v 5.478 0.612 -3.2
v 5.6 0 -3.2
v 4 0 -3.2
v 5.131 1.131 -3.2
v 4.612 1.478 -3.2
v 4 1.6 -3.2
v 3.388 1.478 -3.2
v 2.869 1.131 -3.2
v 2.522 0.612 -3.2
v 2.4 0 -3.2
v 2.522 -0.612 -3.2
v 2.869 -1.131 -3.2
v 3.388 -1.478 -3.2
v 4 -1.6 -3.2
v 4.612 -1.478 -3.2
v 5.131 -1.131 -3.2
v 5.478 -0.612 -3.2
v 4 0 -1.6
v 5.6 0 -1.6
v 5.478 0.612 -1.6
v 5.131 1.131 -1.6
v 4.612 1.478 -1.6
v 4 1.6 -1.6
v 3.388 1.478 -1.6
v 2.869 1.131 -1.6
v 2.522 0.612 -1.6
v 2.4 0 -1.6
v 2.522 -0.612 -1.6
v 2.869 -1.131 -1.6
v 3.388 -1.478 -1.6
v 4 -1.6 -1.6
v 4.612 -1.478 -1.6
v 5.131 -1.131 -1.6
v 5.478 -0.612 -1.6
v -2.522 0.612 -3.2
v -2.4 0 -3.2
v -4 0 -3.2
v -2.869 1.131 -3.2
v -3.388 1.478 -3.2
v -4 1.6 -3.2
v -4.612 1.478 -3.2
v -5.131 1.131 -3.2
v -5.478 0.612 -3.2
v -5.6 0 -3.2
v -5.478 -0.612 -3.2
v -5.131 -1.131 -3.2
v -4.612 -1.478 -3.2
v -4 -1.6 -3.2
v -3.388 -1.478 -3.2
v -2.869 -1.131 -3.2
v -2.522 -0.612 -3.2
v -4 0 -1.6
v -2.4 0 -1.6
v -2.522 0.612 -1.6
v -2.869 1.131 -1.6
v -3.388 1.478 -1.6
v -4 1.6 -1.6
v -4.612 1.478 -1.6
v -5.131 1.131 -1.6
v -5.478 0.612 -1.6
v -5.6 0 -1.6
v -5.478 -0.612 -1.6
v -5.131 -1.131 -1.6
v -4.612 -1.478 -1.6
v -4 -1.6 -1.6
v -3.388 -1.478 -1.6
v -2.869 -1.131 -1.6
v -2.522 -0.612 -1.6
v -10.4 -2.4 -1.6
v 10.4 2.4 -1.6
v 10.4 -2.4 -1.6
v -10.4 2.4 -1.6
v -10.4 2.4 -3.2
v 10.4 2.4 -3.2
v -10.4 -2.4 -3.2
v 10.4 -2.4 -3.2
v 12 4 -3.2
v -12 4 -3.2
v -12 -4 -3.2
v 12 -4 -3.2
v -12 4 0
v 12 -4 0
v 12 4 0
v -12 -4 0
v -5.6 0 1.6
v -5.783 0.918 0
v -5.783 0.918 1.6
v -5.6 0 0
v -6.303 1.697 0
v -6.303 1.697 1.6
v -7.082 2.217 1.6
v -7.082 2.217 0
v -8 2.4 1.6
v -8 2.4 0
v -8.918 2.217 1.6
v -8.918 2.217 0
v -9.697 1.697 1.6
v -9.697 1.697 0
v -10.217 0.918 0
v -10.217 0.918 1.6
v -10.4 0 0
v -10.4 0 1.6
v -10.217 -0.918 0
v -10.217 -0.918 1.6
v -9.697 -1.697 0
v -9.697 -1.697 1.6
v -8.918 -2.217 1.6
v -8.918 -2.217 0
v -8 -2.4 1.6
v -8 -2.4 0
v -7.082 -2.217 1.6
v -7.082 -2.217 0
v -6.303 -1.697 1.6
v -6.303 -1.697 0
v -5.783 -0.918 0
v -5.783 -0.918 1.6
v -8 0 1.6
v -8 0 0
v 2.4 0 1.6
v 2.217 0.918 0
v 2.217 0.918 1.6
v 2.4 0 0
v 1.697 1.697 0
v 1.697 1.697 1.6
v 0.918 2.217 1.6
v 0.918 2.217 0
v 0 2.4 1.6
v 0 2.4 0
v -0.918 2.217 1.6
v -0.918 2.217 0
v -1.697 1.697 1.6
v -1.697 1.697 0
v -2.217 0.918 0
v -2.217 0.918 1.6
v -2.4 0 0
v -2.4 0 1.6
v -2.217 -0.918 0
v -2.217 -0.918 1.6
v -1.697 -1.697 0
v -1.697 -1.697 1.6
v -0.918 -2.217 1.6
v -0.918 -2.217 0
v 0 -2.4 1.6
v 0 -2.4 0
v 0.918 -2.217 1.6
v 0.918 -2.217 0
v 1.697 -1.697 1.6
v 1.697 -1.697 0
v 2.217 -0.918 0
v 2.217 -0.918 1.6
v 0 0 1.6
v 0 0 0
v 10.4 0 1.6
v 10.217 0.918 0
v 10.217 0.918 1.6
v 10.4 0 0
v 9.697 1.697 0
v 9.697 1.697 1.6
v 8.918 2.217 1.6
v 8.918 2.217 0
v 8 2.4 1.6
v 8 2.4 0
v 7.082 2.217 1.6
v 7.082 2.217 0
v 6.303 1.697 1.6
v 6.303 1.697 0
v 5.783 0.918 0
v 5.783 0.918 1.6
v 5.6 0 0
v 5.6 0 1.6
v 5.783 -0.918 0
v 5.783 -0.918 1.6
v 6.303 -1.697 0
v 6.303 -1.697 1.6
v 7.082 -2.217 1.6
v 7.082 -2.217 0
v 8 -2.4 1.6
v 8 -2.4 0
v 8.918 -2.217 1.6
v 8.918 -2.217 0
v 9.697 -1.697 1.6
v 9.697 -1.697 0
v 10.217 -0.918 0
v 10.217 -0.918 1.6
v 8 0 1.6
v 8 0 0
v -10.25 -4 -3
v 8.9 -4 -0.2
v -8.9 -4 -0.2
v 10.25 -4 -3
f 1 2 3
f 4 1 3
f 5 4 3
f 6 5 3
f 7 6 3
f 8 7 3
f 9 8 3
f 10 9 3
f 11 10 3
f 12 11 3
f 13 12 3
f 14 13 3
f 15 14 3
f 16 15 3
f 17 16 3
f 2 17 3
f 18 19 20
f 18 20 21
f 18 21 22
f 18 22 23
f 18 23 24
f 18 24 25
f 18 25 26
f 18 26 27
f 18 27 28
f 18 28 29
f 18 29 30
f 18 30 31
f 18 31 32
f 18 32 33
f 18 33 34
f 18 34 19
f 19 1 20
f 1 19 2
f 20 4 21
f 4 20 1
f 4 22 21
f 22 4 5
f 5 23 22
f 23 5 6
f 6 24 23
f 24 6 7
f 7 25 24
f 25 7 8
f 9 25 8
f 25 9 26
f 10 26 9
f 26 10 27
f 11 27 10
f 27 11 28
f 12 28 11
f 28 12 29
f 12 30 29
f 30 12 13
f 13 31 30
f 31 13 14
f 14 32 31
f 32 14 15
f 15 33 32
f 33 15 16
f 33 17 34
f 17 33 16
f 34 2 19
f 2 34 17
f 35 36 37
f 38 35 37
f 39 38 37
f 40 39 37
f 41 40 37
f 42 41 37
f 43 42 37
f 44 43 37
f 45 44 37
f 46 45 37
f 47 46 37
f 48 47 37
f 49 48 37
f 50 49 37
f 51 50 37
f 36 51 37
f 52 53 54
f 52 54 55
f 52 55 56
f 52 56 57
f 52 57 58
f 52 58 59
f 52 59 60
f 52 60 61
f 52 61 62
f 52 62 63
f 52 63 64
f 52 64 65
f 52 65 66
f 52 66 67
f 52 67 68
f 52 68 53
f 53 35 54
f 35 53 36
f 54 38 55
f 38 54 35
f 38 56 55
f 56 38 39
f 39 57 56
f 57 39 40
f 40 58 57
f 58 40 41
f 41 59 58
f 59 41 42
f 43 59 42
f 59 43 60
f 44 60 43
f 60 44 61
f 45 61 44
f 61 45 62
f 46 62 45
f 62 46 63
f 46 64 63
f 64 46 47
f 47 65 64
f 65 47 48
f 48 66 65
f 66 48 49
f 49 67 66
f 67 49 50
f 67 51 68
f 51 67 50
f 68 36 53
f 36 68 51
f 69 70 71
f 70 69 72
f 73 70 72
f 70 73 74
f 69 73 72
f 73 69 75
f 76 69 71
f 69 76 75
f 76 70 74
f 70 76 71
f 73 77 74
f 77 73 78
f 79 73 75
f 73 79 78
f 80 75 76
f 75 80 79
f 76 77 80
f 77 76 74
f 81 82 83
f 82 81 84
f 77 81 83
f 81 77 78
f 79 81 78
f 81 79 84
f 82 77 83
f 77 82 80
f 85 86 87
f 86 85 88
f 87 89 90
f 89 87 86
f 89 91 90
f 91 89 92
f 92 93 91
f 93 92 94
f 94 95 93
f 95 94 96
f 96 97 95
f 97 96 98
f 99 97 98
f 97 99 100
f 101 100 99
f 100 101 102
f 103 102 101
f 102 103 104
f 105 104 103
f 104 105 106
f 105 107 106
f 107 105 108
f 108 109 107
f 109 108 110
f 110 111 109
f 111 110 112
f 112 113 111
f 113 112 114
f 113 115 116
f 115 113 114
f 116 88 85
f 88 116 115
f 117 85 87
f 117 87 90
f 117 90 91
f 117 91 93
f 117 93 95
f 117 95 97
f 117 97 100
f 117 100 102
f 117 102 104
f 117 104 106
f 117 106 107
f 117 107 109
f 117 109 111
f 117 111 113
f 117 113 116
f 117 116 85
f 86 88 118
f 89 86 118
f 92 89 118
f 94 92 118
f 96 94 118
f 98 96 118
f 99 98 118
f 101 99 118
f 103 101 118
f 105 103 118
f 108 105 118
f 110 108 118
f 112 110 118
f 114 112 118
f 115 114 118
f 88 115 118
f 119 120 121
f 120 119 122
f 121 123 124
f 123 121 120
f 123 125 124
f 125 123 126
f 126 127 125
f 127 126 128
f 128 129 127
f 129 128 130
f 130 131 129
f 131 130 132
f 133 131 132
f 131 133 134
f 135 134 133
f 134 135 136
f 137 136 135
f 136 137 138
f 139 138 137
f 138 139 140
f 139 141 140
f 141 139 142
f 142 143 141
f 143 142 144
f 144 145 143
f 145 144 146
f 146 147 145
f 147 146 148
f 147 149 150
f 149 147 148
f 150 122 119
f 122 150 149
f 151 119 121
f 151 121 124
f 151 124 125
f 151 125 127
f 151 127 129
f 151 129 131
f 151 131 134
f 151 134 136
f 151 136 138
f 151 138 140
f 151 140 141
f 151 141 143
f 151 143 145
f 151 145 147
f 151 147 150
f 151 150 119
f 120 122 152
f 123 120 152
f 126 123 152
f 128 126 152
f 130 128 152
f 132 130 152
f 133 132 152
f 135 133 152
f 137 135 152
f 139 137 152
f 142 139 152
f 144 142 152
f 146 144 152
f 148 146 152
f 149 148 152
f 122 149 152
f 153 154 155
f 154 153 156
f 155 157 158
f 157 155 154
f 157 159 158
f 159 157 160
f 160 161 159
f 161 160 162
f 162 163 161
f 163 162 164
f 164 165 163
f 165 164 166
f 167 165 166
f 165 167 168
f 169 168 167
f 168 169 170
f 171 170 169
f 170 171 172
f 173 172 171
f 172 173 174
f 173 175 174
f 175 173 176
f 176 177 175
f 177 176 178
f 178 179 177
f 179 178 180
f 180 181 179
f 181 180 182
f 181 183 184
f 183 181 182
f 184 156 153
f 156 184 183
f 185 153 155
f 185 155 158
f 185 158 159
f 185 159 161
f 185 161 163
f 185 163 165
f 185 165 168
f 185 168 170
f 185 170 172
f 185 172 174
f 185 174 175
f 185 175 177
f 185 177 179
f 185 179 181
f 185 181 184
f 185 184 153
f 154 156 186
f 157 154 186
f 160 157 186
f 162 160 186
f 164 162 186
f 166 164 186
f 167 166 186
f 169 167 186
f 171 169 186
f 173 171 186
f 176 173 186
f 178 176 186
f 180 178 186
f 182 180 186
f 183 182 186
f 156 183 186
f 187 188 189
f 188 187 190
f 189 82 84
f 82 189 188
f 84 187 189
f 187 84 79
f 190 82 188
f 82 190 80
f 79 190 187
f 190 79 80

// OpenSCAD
// file: ../p/stud.scad
use <../lib.scad>
use <4-4cyli.scad>
use <4-4disc.scad>
use <4-4edge.scad>
function ldraw_lib__stud() = [
// 0 Stud
// 0 Name: stud.dat
// 0 Author: James Jessiman
// 0 !LDRAW_ORG Primitive UPDATE 2012-01
// 0 !LICENSE Licensed under CC BY 4.0 : see CAreadme.txt
// 
// 0 BFC CERTIFY CCW
  [0,"BFC","CERTIFY"],
  [0,"BFC","CCW"],
// 
// 0 !HISTORY 2002-04-04 [sbliss] Modified for BFC compliance
// 0 !HISTORY 2002-04-25 [PTadmin] Official Update 2002-02
// 0 !HISTORY 2007-06-24 [PTadmin] Header formatted for Contributor Agreement
// 0 !HISTORY 2008-07-01 [PTadmin] Official Update 2008-01
// 0 !HISTORY 2012-02-16 [Philo] Changed to CCW
// 0 !HISTORY 2012-03-30 [PTadmin] Official Update 2012-01
// 
// 
// 1 16 0 0 0 6 0 0 0 1 0 0 0 6 4-4edge.dat
  [1,16,0,0,0,6,0,0,0,1,0,0,0,6, ldraw_lib__4_4edge()],
// 1 16 0 -4 0 6 0 0 0 1 0 0 0 6 4-4edge.dat
  [1,16,0,-4,0,6,0,0,0,1,0,0,0,6, ldraw_lib__4_4edge()],
// 1 16 0 0 0 6 0 0 0 -4 0 0 0 6 4-4cyli.dat
  [1,16,0,0,0,6,0,0,0,-4,0,0,0,6, ldraw_lib__4_4cyli()],
// 1 16 0 -4 0 6 0 0 0 1 0 0 0 6 4-4disc.dat
  [1,16,0,-4,0,6,0,0,0,1,0,0,0,6, ldraw_lib__4_4disc()],
  [-1,16,0,0,0,6,0,0,0,-1,0,0,0,6, ldraw_lib__4_4disc()],
];
module ldraw_lib__stud(step=0, col=false, unit=2/5, alt=false, line=0.2, solid=!$preview)
    makepoly(ldraw_lib__stud(), step=step, col=col, unit=unit, alt=alt, line=line, solid=solid);
ldraw_lib__stud(line=0.2);
// file: ../p/4-4edge.scad
use <../lib.scad>
function ldraw_lib__4_4edge() = [
// 0 Circle 1.0
// 0 Name: 4-4edge.dat
// 0 Author: James Jessiman
// 0 !LDRAW_ORG Primitive UPDATE 2017-01
// 0 !LICENSE Licensed under CC BY 2.0 and CC BY 4.0 : see CAreadme.txt
// 
// 0 BFC CERTIFY CCW
  [0,"BFC","CERTIFY"],
  [0,"BFC","CCW"],
// 
// 0 !HISTORY 1998-12-15 [PTadmin] Official Update 1998-10
// 0 !HISTORY 2005-12-28 [PTadmin] Official Update 2005-01
// 0 !HISTORY 2007-06-24 [PTadmin] Header formatted for Contributor Agreement
// 0 !HISTORY 2008-07-01 [PTadmin] Official Update 2008-01
// 0 !HISTORY 2017-01-15 [Steffen] BFCed
// 0 !HISTORY 2017-12-30 [PTadmin] Official Update 2017-01
// 
// 
// 2 24 1 0 0 0.9239 0 0.3827
  [2,24,1,0,0,0.9239,0,0.3827],
// 2 24 0.9239 0 0.3827 0.7071 0 0.7071
  [2,24,0.9239,0,0.3827,0.7071,0,0.7071],
// 2 24 0.7071 0 0.7071 0.3827 0 0.9239
  [2,24,0.7071,0,0.7071,0.3827,0,0.9239],
// 2 24 0.3827 0 0.9239 0 0 1
  [2,24,0.3827,0,0.9239,0,0,1],
// 2 24 0 0 1 -0.3827 0 0.9239
  [2,24,0,0,1,-0.3827,0,0.9239],
// 2 24 -0.3827 0 0.9239 -0.7071 0 0.7071
  [2,24,-0.3827,0,0.9239,-0.7071,0,0.7071],
// 2 24 -0.7071 0 0.7071 -0.9239 0 0.3827
  [2,24,-0.7071,0,0.7071,-0.9239,0,0.3827],
// 2 24 -0.9239 0 0.3827 -1 0 -0
  [2,24,-0.9239,0,0.3827,-1,0,-0],
// 2 24 -1 0 -0 -0.9239 0 -0.3827
  [2,24,-1,0,-0,-0.9239,0,-0.3827],
// 2 24 -0.9239 0 -0.3827 -0.7071 0 -0.7071
  [2,24,-0.9239,0,-0.3827,-0.7071,0,-0.7071],
// 2 24 -0.7071 0 -0.7071 -0.3827 0 -0.9239
  [2,24,-0.7071,0,-0.7071,-0.3827,0,-0.9239],
// 2 24 -0.3827 0 -0.9239 0 0 -1
  [2,24,-0.3827,0,-0.9239,0,0,-1],
// 2 24 0 0 -1 0.3827 0 -0.9239
  [2,24,0,0,-1,0.3827,0,-0.9239],
// 2 24 0.3827 0 -0.9239 0.7071 0 -0.7071
  [2,24,0.3827,0,-0.9239,0.7071,0,-0.7071],
// 2 24 0.7071 0 -0.7071 0.9239 0 -0.3827
  [2,24,0.7071,0,-0.7071,0.9239,0,-0.3827],
// 2 24 0.9239 0 -0.3827 1 0 0
  [2,24,0.9239,0,-0.3827,1,0,0],
];
module ldraw_lib__4_4edge(step=0, col=false, unit=2/5, alt=false, line=0.2, solid=!$preview)
    makepoly(ldraw_lib__4_4edge(), step=step, col=col, unit=unit, alt=alt, line=line, solid=solid);
ldraw_lib__4_4edge(line=0.2);
// file: ../p/4-4disc.scad
use <../lib.scad>
function ldraw_lib__4_4disc() = [
// 0 Disc 1.0
// 0 Name: 4-4disc.dat
// 0 Author: James Jessiman
// 0 !LDRAW_ORG Primitive UPDATE 2002-02
// 0 !LICENSE Licensed under CC BY 2.0 and CC BY 4.0 : see CAreadme.txt
// 
// 0 BFC CERTIFY CCW
  [0,"BFC","CERTIFY"],
  [0,"BFC","CCW"],
// 
// 0 !HISTORY 1998-12-15 [PTadmin] Official Update 1998-10
// 0 !HISTORY 2002-03-23 [sbliss] Added BFC statement
// 0 !HISTORY 2002-04-25 [PTadmin] Official Update 2002-02
// 0 !HISTORY 2007-06-24 [PTadmin] Header formatted for Contributor Agreement
// 0 !HISTORY 2008-07-01 [PTadmin] Official Update 2008-01
// 
// 
// 3 16 0 0 0 1 0 0 0.9239 0 0.3827
  [3,16,0,0,0,1,0,0,0.9239,0,0.3827],
// 3 16 0 0 0 0.9239 0 0.3827 0.7071 0 0.7071
  [3,16,0,0,0,0.9239,0,0.3827,0.7071,0,0.7071],
// 3 16 0 0 0 0.7071 0 0.7071 0.3827 0 0.9239
  [3,16,0,0,0,0.7071,0,0.7071,0.3827,0,0.9239],
// 3 16 0 0 0 0.3827 0 0.9239 0 0 1
  [3,16,0,0,0,0.3827,0,0.9239,0,0,1],
// 3 16 0 0 0 0 0 1 -0.3827 0 0.9239
  [3,16,0,0,0,0,0,1,-0.3827,0,0.9239],
// 3 16 0 0 0 -0.3827 0 0.9239 -0.7071 0 0.7071
  [3,16,0,0,0,-0.3827,0,0.9239,-0.7071,0,0.7071],
// 3 16 0 0 0 -0.7071 0 0.7071 -0.9239 0 0.3827
  [3,16,0,0,0,-0.7071,0,0.7071,-0.9239,0,0.3827],
// 3 16 0 0 0 -0.9239 0 0.3827 -1 0 -0
  [3,16,0,0,0,-0.9239,0,0.3827,-1,0,-0],
// 3 16 0 0 0 -1 0 -0 -0.9239 0 -0.3827
  [3,16,0,0,0,-1,0,-0,-0.9239,0,-0.3827],
// 3 16 0 0 0 -0.9239 0 -0.3827 -0.7071 0 -0.7071
  [3,16,0,0,0,-0.9239,0,-0.3827,-0.7071,0,-0.7071],
// 3 16 0 0 0 -0.7071 0 -0.7071 -0.3827 0 -0.9239
  [3,16,0,0,0,-0.7071,0,-0.7071,-0.3827,0,-0.9239],
// 3 16 0 0 0 -0.3827 0 -0.9239 0 0 -1
  [3,16,0,0,0,-0.3827,0,-0.9239,0,0,-1],
// 3 16 0 0 0 0 0 -1 0.3827 0 -0.9239
  [3,16,0,0,0,0,0,-1,0.3827,0,-0.9239],
// 3 16 0 0 0 0.3827 0 -0.9239 0.7071 0 -0.7071
  [3,16,0,0,0,0.3827,0,-0.9239,0.7071,0,-0.7071],
// 3 16 0 0 0 0.7071 0 -0.7071 0.9239 0 -0.3827
  [3,16,0,0,0,0.7071,0,-0.7071,0.9239,0,-0.3827],
// 3 16 0 0 0 0.9239 0 -0.3827 1 0 0
  [3,16,0,0,0,0.9239,0,-0.3827,1,0,0],
// 0
];
module ldraw_lib__4_4disc(step=0, col=false, unit=2/5, alt=false, line=0.2, solid=!$preview)
    makepoly(ldraw_lib__4_4disc(), step=step, col=col, unit=unit, alt=alt, line=line, solid=solid);
ldraw_lib__4_4disc(line=0.2);
// file: ../p/4-4cyli.scad
use <../lib.scad>
$fa=1; $fs=0.2;
function ldraw_lib__4_4cyli(realsolid=false) = [
// 0 Cylinder 1.0
// 0 Name: 4-4cyli.dat
// 0 Author: James Jessiman
// 0 !LDRAW_ORG Primitive UPDATE 2005-01
// 0 !LICENSE Licensed under CC BY 2.0 and CC BY 4.0 : see CAreadme.txt
// 
// 0 BFC CERTIFY CCW
  [0,"BFC","CERTIFY"],
  [0,"BFC","CCW"],
// 
// 0 !HISTORY 1998-12-15 [PTadmin] Official Update 1998-10
// 0 !HISTORY 2002-03-23 [sbliss] Added BFC statement; merged headers from files in distributions LDraw 0.27 and Complete.
// 0 !HISTORY 2002-04-25 [PTadmin] Official Update 2002-02
// 0 !HISTORY 2004-12-14 [guyvivan] BFC CCW
// 0 !HISTORY 2005-12-28 [PTadmin] Official Update 2005-01
// 0 !HISTORY 2007-06-24 [PTadmin] Header formatted for Contributor Agreement
// 0 !HISTORY 2008-07-01 [PTadmin] Official Update 2008-01
// 
// 
// 4 16 1 1 0 0.9239 1 0.3827 0.9239 0 0.3827 1 0 0
  [4,16,1,1,0,0.9239,1,0.3827,0.9239,0,0.3827,1,0,0],
// 5 24 1 0 0 1 1 0 0.9239 0 0.3827 0.9239 0 -0.3827
  [5,24,1,0,0,1,1,0,0.9239,0,0.3827,0.9239,0,-0.3827],
// 4 16 0.9239 1 0.3827 0.7071 1 0.7071 0.7071 0 0.7071 0.9239 0 0.3827
  [4,16,0.9239,1,0.3827,0.7071,1,0.7071,0.7071,0,0.7071,0.9239,0,0.3827],
// 5 24 0.9239 0 0.3827 0.9239 1 0.3827 0.7071 0 0.7071 1 0 0
  [5,24,0.9239,0,0.3827,0.9239,1,0.3827,0.7071,0,0.7071,1,0,0],
// 4 16 0.7071 1 0.7071 0.3827 1 0.9239 0.3827 0 0.9239 0.7071 0 0.7071
  [4,16,0.7071,1,0.7071,0.3827,1,0.9239,0.3827,0,0.9239,0.7071,0,0.7071],
// 5 24 0.7071 0 0.7071 0.7071 1 0.7071 0.3827 0 0.9239 0.9239 0 0.3827
  [5,24,0.7071,0,0.7071,0.7071,1,0.7071,0.3827,0,0.9239,0.9239,0,0.3827],
// 4 16 0.3827 1 0.9239 0 1 1 0 0 1 0.3827 0 0.9239
  [4,16,0.3827,1,0.9239,0,1,1,0,0,1,0.3827,0,0.9239],
// 5 24 0.3827 0 0.9239 0.3827 1 0.9239 0 0 1 0.7071 0 0.7071
  [5,24,0.3827,0,0.9239,0.3827,1,0.9239,0,0,1,0.7071,0,0.7071],
// 4 16 0 1 1 -0.3827 1 0.9239 -0.3827 0 0.9239 0 0 1
  [4,16,0,1,1,-0.3827,1,0.9239,-0.3827,0,0.9239,0,0,1],
// 5 24 0 0 1 0 1 1 -0.3827 0 0.9239 0.3827 0 0.9239
  [5,24,0,0,1,0,1,1,-0.3827,0,0.9239,0.3827,0,0.9239],
// 4 16 -0.3827 1 0.9239 -0.7071 1 0.7071 -0.7071 0 0.7071 -0.3827 0 0.9239
  [4,16,-0.3827,1,0.9239,-0.7071,1,0.7071,-0.7071,0,0.7071,-0.3827,0,0.9239],
// 5 24 -0.3827 0 0.9239 -0.3827 1 0.9239 -0.7071 0 0.7071 0 0 1
  [5,24,-0.3827,0,0.9239,-0.3827,1,0.9239,-0.7071,0,0.7071,0,0,1],
// 4 16 -0.7071 1 0.7071 -0.9239 1 0.3827 -0.9239 0 0.3827 -0.7071 0 0.7071
  [4,16,-0.7071,1,0.7071,-0.9239,1,0.3827,-0.9239,0,0.3827,-0.7071,0,0.7071],
// 5 24 -0.7071 0 0.7071 -0.7071 1 0.7071 -0.9239 0 0.3827 -0.3827 0 0.9239
  [5,24,-0.7071,0,0.7071,-0.7071,1,0.7071,-0.9239,0,0.3827,-0.3827,0,0.9239],
// 4 16 -0.9239 1 0.3827 -1 1 0 -1 0 0 -0.9239 0 0.3827
  [4,16,-0.9239,1,0.3827,-1,1,0,-1,0,0,-0.9239,0,0.3827],
// 5 24 -0.9239 0 0.3827 -0.9239 1 0.3827 -1 0 0 -0.7071 0 0.7071
  [5,24,-0.9239,0,0.3827,-0.9239,1,0.3827,-1,0,0,-0.7071,0,0.7071],
// 4 16 -1 1 0 -0.9239 1 -0.3827 -0.9239 0 -0.3827 -1 0 0
  [4,16,-1,1,0,-0.9239,1,-0.3827,-0.9239,0,-0.3827,-1,0,0],
// 5 24 -1 0 0 -1 1 0 -0.9239 0 -0.3827 -0.9239 0 0.3827
  [5,24,-1,0,0,-1,1,0,-0.9239,0,-0.3827,-0.9239,0,0.3827],
// 4 16 -0.9239 1 -0.3827 -0.7071 1 -0.7071 -0.7071 0 -0.7071 -0.9239 0 -0.3827
  [4,16,-0.9239,1,-0.3827,-0.7071,1,-0.7071,-0.7071,0,-0.7071,-0.9239,0,-0.3827],
// 5 24 -0.9239 0 -0.3827 -0.9239 1 -0.3827 -0.7071 0 -0.7071 -1 0 0
  [5,24,-0.9239,0,-0.3827,-0.9239,1,-0.3827,-0.7071,0,-0.7071,-1,0,0],
// 4 16 -0.7071 1 -0.7071 -0.3827 1 -0.9239 -0.3827 0 -0.9239 -0.7071 0 -0.7071
  [4,16,-0.7071,1,-0.7071,-0.3827,1,-0.9239,-0.3827,0,-0.9239,-0.7071,0,-0.7071],
// 5 24 -0.7071 0 -0.7071 -0.7071 1 -0.7071 -0.3827 0 -0.9239 -0.9239 0 -0.3827
  [5,24,-0.7071,0,-0.7071,-0.7071,1,-0.7071,-0.3827,0,-0.9239,-0.9239,0,-0.3827],
// 4 16 -0.3827 1 -0.9239 0 1 -1 0 0 -1 -0.3827 0 -0.9239
  [4,16,-0.3827,1,-0.9239,0,1,-1,0,0,-1,-0.3827,0,-0.9239],
// 5 24 -0.3827 0 -0.9239 -0.3827 1 -0.9239 0 0 -1 -0.7071 0 -0.7071
  [5,24,-0.3827,0,-0.9239,-0.3827,1,-0.9239,0,0,-1,-0.7071,0,-0.7071],
// 4 16 0 1 -1 0.3827 1 -0.9239 0.3827 0 -0.9239 0 0 -1
  [4,16,0,1,-1,0.3827,1,-0.9239,0.3827,0,-0.9239,0,0,-1],
// 5 24 0 0 -1 0 1 -1 0.3827 0 -0.9239 -0.3827 0 -0.9239
  [5,24,0,0,-1,0,1,-1,0.3827,0,-0.9239,-0.3827,0,-0.9239],
// 4 16 0.3827 1 -0.9239 0.7071 1 -0.7071 0.7071 0 -0.7071 0.3827 0 -0.9239
  [4,16,0.3827,1,-0.9239,0.7071,1,-0.7071,0.7071,0,-0.7071,0.3827,0,-0.9239],
// 5 24 0.3827 0 -0.9239 0.3827 1 -0.9239 0.7071 0 -0.7071 0 0 -1
  [5,24,0.3827,0,-0.9239,0.3827,1,-0.9239,0.7071,0,-0.7071,0,0,-1],
// 4 16 0.7071 1 -0.7071 0.9239 1 -0.3827 0.9239 0 -0.3827 0.7071 0 -0.7071
  [4,16,0.7071,1,-0.7071,0.9239,1,-0.3827,0.9239,0,-0.3827,0.7071,0,-0.7071],
// 5 24 0.7071 0 -0.7071 0.7071 1 -0.7071 0.9239 0 -0.3827 0.3827 0 -0.9239
  [5,24,0.7071,0,-0.7071,0.7071,1,-0.7071,0.9239,0,-0.3827,0.3827,0,-0.9239],
// 4 16 0.9239 1 -0.3827 1 1 0 1 0 0 0.9239 0 -0.3827
  [4,16,0.9239,1,-0.3827,1,1,0,1,0,0,0.9239,0,-0.3827],
// 5 24 0.9239 0 -0.3827 0.9239 1 -0.3827 1 0 0 0.7071 0 -0.7071
  [5,24,0.9239,0,-0.3827,0.9239,1,-0.3827,1,0,0,0.7071,0,-0.7071],
// 0
];
module ldraw_lib__4_4cyli(step=0, col=false, unit=2/5, alt=false, line=0.2, solid=!$preview)
    makepoly(ldraw_lib__4_4cyli(solid), step=step, col=col, unit=unit, alt=alt, line=line, solid=solid);
ldraw_lib__4_4cyli(line=0.2);
// file: ../p/stug-1x3.scad
use <../lib.scad>
use <stud.scad>
$fa=1; $fs=0.2;
function ldraw_lib__stug_1x3(realsolid=false) = [
// 0 Stud Group  1 x  3
// 0 Name: stug-1x3.dat
// 0 Author: Steffen [Steffen]
// 0 !LDRAW_ORG Primitive UPDATE 2012-01
// 0 !LICENSE Licensed under CC BY 2.0 and CC BY 4.0 : see CAreadme.txt
// 
// 0 BFC CERTIFY CCW
  [0,"BFC","CERTIFY"],
  [0,"BFC","CCW"],
// 
// 0 !HISTORY 2012-03-30 [PTadmin] Official Update 2012-01
// 
// 
// 1 16 -20 0 0 1 0 0 0 1 0 0 0 1 stud.dat
  [1,16,-20,0,0,1,0,0,0,1,0,0,0,1, ldraw_lib__stud(realsolid)],
// 1 16 0 0 0 1 0 0 0 1 0 0 0 1 stud.dat
  [1,16,0,0,0,1,0,0,0,1,0,0,0,1, ldraw_lib__stud(realsolid)],
// 1 16 20 0 0 1 0 0 0 1 0 0 0 1 stud.dat
  [1,16,20,0,0,1,0,0,0,1,0,0,0,1, ldraw_lib__stud(realsolid)],
];
module ldraw_lib__stug_1x3(step=0, col=false, unit=2/5, alt=false, line=0.2, solid=!$preview)
    makepoly(ldraw_lib__stug_1x3(solid), step=step, col=col, unit=unit, alt=alt, line=line, solid=solid);
ldraw_lib__stug_1x3(line=0.2);
// file: ../p/stud3.scad
use <../lib.scad>
use <4-4cyli.scad>
use <4-4disc.scad>
use <4-4edge.scad>
function ldraw_lib__stud3() = [
// 0 Stud Tube Solid
// 0 Name: stud3.dat
// 0 Author: James Jessiman
// 0 !LDRAW_ORG Primitive UPDATE 2012-01
// 0 !LICENSE Licensed under CC BY 4.0 : see CAreadme.txt
// 
// 0 BFC CERTIFY CCW
  [0,"BFC","CERTIFY"],
  [0,"BFC","CCW"],
// 
// 0 !HISTORY 2002-04-04 [sbliss] Modified for BFC compliance
// 0 !HISTORY 2002-04-25 [PTadmin] Official Update 2002-02
// 0 !HISTORY 2007-06-24 [PTadmin] Header formatted for Contributor Agreement
// 0 !HISTORY 2008-07-01 [PTadmin] Official Update 2008-01
// 0 !HISTORY 2012-02-16 [Philo] Changed to CCW
// 0 !HISTORY 2012-03-30 [PTadmin] Official Update 2012-01
// 
// 
// 1 16 0 -4 0 4 0 0 0 1 0 0 0 4 4-4edge.dat
  [1,16,0,-4,0,4,0,0,0,1,0,0,0,4, ldraw_lib__4_4edge()],
// 1 16 0 0 0 4 0 0 0 1 0 0 0 4 4-4edge.dat
  [1,16,0,0,0,4,0,0,0,1,0,0,0,4, ldraw_lib__4_4edge()],
// 1 16 0 -4 0 4 0 0 0 1 0 0 0 4 4-4disc.dat
  [1,16,0,-4,0,4,0,0,0,1,0,0,0,4, ldraw_lib__4_4disc()],
  [-1,16,0,0,0,4,0,0,0,-1,0,0,0,4, ldraw_lib__4_4disc()],
// 1 16 0 -4 0 4 0 0 0 4 0 0 0 4 4-4cyli.dat
  [1,16,0,-4,0,4,0,0,0,4,0,0,0,4, ldraw_lib__4_4cyli()],
];
module ldraw_lib__stud3(step=0, col=false, unit=2/5, alt=false, line=0.2, solid=!$preview)
    makepoly(ldraw_lib__stud3(), step=step, col=col, unit=unit, alt=alt, line=line, solid=solid);
ldraw_lib__stud3(line=0.2);
// file: ../p/box5.scad
use <../lib.scad>
function ldraw_lib__box5() = [
// 0 Box with 5 Faces and All Edges
// 0 Name: box5.dat
// 0 Author: James Jessiman
// 0 !LDRAW_ORG Primitive UPDATE 2012-01
// 0 !LICENSE Licensed under CC BY 2.0 and CC BY 4.0 : see CAreadme.txt
// 
// 0 BFC CERTIFY CCW
  [0,"BFC","CERTIFY"],
  [0,"BFC","CCW"],
// 
// 0 !HISTORY 2002-04-03 [sbliss] Modified for BFC compliance
// 0 !HISTORY 2002-04-25 [PTadmin] Official Update 2002-02
// 0 !HISTORY 2007-06-24 [PTadmin] Header formatted for Contributor Agreement
// 0 !HISTORY 2008-07-01 [PTadmin] Official Update 2008-01
// 0 !HISTORY 2012-02-16 [Philo] Changed to CCW
// 0 !HISTORY 2012-03-30 [PTadmin] Official Update 2012-01
// 
// 
// 2 24 1 1 1 -1 1 1
  [2,24,1,1,1,-1,1,1],
// 2 24 -1 1 1 -1 1 -1
  [2,24,-1,1,1,-1,1,-1],
// 2 24 -1 1 -1 1 1 -1
  [2,24,-1,1,-1,1,1,-1],
// 2 24 1 1 -1 1 1 1
  [2,24,1,1,-1,1,1,1],
// 2 24 1 0 1 -1 0 1
  [2,24,1,0,1,-1,0,1],
// 2 24 -1 0 1 -1 0 -1
  [2,24,-1,0,1,-1,0,-1],
// 2 24 -1 0 -1 1 0 -1
  [2,24,-1,0,-1,1,0,-1],
// 2 24 1 0 -1 1 0 1
  [2,24,1,0,-1,1,0,1],
// 2 24 1 0 1 1 1 1
  [2,24,1,0,1,1,1,1],
// 2 24 -1 0 1 -1 1 1
  [2,24,-1,0,1,-1,1,1],
// 2 24 1 0 -1 1 1 -1
  [2,24,1,0,-1,1,1,-1],
// 2 24 -1 0 -1 -1 1 -1
  [2,24,-1,0,-1,-1,1,-1],
// 4 16 -1 1 1 1 1 1 1 1 -1 -1 1 -1
  [4,16,-1,1,1,1,1,1,1,1,-1,-1,1,-1],
// 4 16 -1 1 1 -1 0 1 1 0 1 1 1 1
  [4,16,-1,1,1,-1,0,1,1,0,1,1,1,1],
// 4 16 -1 1 -1 -1 0 -1 -1 0 1 -1 1 1
  [4,16,-1,1,-1,-1,0,-1,-1,0,1,-1,1,1],
// 4 16 1 1 -1 1 0 -1 -1 0 -1 -1 1 -1
  [4,16,1,1,-1,1,0,-1,-1,0,-1,-1,1,-1],
// 4 16 1 1 1 1 0 1 1 0 -1 1 1 -1
  [4,16,1,1,1,1,0,1,1,0,-1,1,1,-1],
];
makepoly(ldraw_lib__box5(), line=0.2);
// file: ../p/box4t.scad
use <../lib.scad>
function ldraw_lib__box4t() = [
// 0 Box with 4 Adjacent Faces and All Edges
// 0 Name: box4t.dat
// 0 Author: Tore Eriksson [Tore_Eriksson]
// 0 !LDRAW_ORG Primitive UPDATE 2003-02
// 0 !LICENSE Licensed under CC BY 2.0 and CC BY 4.0 : see CAreadme.txt
// 
// 0 BFC CERTIFY CCW
  [0,"BFC","CERTIFY"],
  [0,"BFC","CCW"],
// 
// 0 !HISTORY 1997-09-29 [PTadmin] Official Update 1997-15
// 0 !HISTORY 2002-08-31 [izanette] Modified with WINDZ for BFC compliance
// 0 !HISTORY 2003-08-01 [PTadmin] Official Update 2003-02
// 0 !HISTORY 2007-06-24 [PTadmin] Header formatted for Contributor Agreement
// 0 !HISTORY 2008-07-01 [PTadmin] Official Update 2008-01
// 
// 
// 2 24 1 1 1 -1 1 1
  [2,24,1,1,1,-1,1,1],
// 2 24 -1 1 1 -1 1 -1
  [2,24,-1,1,1,-1,1,-1],
// 2 24 -1 1 -1 1 1 -1
  [2,24,-1,1,-1,1,1,-1],
// 2 24 1 1 -1 1 1 1
  [2,24,1,1,-1,1,1,1],
// 2 24 1 0 1 -1 0 1
  [2,24,1,0,1,-1,0,1],
// 2 24 -1 0 1 -1 0 -1
  [2,24,-1,0,1,-1,0,-1],
// 2 24 -1 0 -1 1 0 -1
  [2,24,-1,0,-1,1,0,-1],
// 2 24 1 0 -1 1 0 1
  [2,24,1,0,-1,1,0,1],
// 2 24 1 0 1 1 1 1
  [2,24,1,0,1,1,1,1],
// 2 24 -1 0 1 -1 1 1
  [2,24,-1,0,1,-1,1,1],
// 2 24 1 0 -1 1 1 -1
  [2,24,1,0,-1,1,1,-1],
// 2 24 -1 0 -1 -1 1 -1
  [2,24,-1,0,-1,-1,1,-1],
// 4 16 1 1 1 1 1 -1 -1 1 -1 -1 1 1
  [4,16,1,1,1,1,1,-1,-1,1,-1,-1,1,1],
// 4 16 1 1 1 -1 1 1 -1 0 1 1 0 1
  [4,16,1,1,1,-1,1,1,-1,0,1,1,0,1],
// 4 16 -1 1 1 -1 1 -1 -1 0 -1 -1 0 1
  [4,16,-1,1,1,-1,1,-1,-1,0,-1,-1,0,1],
// 0 4 16 -1 1 -1 -1 0 -1 1 0 -1 1 1 -1
// 4 16 1 1 -1 1 1 1 1 0 1 1 0 -1
  [4,16,1,1,-1,1,1,1,1,0,1,1,0,-1],
// 0
];
makepoly(ldraw_lib__box4t(), line=0.2);
// file: s/3623s01.scad
use <../../lib.scad>
use <../../p/box4t.scad>
use <../../p/box5.scad>
use <../../p/stud3.scad>
use <../../p/stug-1x3.scad>
function ldraw_lib__s__3623s01() = [
// 0 ~Plate  1 x  3 without Front Face
// 0 Name: s\3623s01.dat
// 0 Author: Massimo Maso [Sirio]
// 0 !LDRAW_ORG Subpart UPDATE 2017-01
// 0 !LICENSE Licensed under CC BY 2.0 and CC BY 4.0 : see CAreadme.txt
// 
// 0 BFC CERTIFY CCW
  [0,"BFC","CERTIFY"],
  [0,"BFC","CCW"],
// 
// 0 !HISTORY 2017-12-30 [PTadmin] Official Update 2017-01
// 
// 
// 1 16 10 4 0 1 0 0 0 -1 0 0 0 1 stud3.dat
  [1,16,10,4,0,1,0,0,0,-1,0,0,0,1, ldraw_lib__stud3()],
// 1 16 -10 4 0 1 0 0 0 -1 0 0 0 1 stud3.dat
  [1,16,-10,4,0,1,0,0,0,-1,0,0,0,1, ldraw_lib__stud3()],
// 0 BFC INVERTNEXT
  [0,"BFC","INVERTNEXT"],
// 1 16 0 8 0 26 0 0 0 -4 0 0 0 6 box5.dat
  [1,16,0,8,0,26,0,0,0,-4,0,0,0,6, ldraw_lib__box5()],
// 4 16 30 8 10 26 8 6 -26 8 6 -30 8 10
  [4,16,30,8,10,26,8,6,-26,8,6,-30,8,10],
// 4 16 -30 8 10 -26 8 6 -26 8 -6 -30 8 -10
  [4,16,-30,8,10,-26,8,6,-26,8,-6,-30,8,-10],
// 4 16 -30 8 -10 -26 8 -6 26 8 -6 30 8 -10
  [4,16,-30,8,-10,-26,8,-6,26,8,-6,30,8,-10],
// 4 16 30 8 -10 26 8 -6 26 8 6 30 8 10
  [4,16,30,8,-10,26,8,-6,26,8,6,30,8,10],
// 1 16 0 8 0 30 0 0 0 -8 0 0 0 10 box4t.dat
  [1,16,0,8,0,30,0,0,0,-8,0,0,0,10, ldraw_lib__box4t()],
// 1 16 0 0 0 1 0 0 0 1 0 0 0 1 stug-1x3.dat
  [1,16,0,0,0,1,0,0,0,1,0,0,0,1, ldraw_lib__stug_1x3()],
];
module ldraw_lib__s__3623s01(step=0, col=false, unit=2/5, alt=false, line=0.2, solid=!$preview)
    makepoly(ldraw_lib__s__3623s01(), step=step, col=col, unit=unit, alt=alt, line=line, solid=solid);
ldraw_lib__s__3623s01(line=0.2);
// main file
use <../lib.scad>
use <s/3623s01.scad>
function ldraw_lib__3623p03() = [
// 0 Plate  1 x  3 with Black Trapezoid Pattern
// 0 Name: 3623p03.dat
// 0 Author: Massimo Maso [Sirio]
// 0 !LDRAW_ORG Part UPDATE 2022-06
// 0 !LICENSE Licensed under CC BY 4.0 : see CAreadme.txt
// 
// 0 BFC CERTIFY CCW
  [0,"BFC","CERTIFY"],
  [0,"BFC","CCW"],
// 
// 0 !KEYWORDS 1970, Bricklink 3623pb023, Charger, Dodge, Dominic, Fast & Furious
// 0 !KEYWORDS R/T, Rebrickable 3623pr0031, Set 76912, Speed Champions, Toretto
// 
// 0 !HISTORY 2022-12-20 [PTadmin] Official Update 2022-06
// 
// 
// 0 // Subpart
// 1 16 0 0 0 1 0 0 0 1 0 0 0 1 s\3623s01.dat
  [1,16,0,0,0,1,0,0,0,1,0,0,0,1, ldraw_lib__s__3623s01()],
// 0 // Black face
// 4 0 -22.25 .5 -10 -25.625 7.5 -10 25.625 7.5 -10 22.25 .5 -10
  [4,0,-22.25,.5,-10,-25.625,7.5,-10,25.625,7.5,-10,22.25,.5,-10],
// 0 // Neutral faces
// 4 16 -30 0 -10 -22.25 .5 -10 22.25 .5 -10 30 0 -10
  [4,16,-30,0,-10,-22.25,.5,-10,22.25,.5,-10,30,0,-10],
// 4 16 -30 0 -10 -30 8 -10 -25.625 7.5 -10 -22.25 .5 -10
  [4,16,-30,0,-10,-30,8,-10,-25.625,7.5,-10,-22.25,.5,-10],
// 4 16 30 8 -10 30 0 -10 22.25 .5 -10 25.625 7.5 -10
  [4,16,30,8,-10,30,0,-10,22.25,.5,-10,25.625,7.5,-10],
// 4 16 30 8 -10 25.625 7.5 -10 -25.625 7.5 -10 -30 8 -10
  [4,16,30,8,-10,25.625,7.5,-10,-25.625,7.5,-10,-30,8,-10],
];
module ldraw_lib__3623p03(step=0, col=false, unit=2/5, alt=false, line=0.2, solid=!$preview)
    makepoly(ldraw_lib__3623p03(), step=step, col=col, unit=unit, alt=alt, line=line, solid=solid);
ldraw_lib__3623p03(line=0.2);
